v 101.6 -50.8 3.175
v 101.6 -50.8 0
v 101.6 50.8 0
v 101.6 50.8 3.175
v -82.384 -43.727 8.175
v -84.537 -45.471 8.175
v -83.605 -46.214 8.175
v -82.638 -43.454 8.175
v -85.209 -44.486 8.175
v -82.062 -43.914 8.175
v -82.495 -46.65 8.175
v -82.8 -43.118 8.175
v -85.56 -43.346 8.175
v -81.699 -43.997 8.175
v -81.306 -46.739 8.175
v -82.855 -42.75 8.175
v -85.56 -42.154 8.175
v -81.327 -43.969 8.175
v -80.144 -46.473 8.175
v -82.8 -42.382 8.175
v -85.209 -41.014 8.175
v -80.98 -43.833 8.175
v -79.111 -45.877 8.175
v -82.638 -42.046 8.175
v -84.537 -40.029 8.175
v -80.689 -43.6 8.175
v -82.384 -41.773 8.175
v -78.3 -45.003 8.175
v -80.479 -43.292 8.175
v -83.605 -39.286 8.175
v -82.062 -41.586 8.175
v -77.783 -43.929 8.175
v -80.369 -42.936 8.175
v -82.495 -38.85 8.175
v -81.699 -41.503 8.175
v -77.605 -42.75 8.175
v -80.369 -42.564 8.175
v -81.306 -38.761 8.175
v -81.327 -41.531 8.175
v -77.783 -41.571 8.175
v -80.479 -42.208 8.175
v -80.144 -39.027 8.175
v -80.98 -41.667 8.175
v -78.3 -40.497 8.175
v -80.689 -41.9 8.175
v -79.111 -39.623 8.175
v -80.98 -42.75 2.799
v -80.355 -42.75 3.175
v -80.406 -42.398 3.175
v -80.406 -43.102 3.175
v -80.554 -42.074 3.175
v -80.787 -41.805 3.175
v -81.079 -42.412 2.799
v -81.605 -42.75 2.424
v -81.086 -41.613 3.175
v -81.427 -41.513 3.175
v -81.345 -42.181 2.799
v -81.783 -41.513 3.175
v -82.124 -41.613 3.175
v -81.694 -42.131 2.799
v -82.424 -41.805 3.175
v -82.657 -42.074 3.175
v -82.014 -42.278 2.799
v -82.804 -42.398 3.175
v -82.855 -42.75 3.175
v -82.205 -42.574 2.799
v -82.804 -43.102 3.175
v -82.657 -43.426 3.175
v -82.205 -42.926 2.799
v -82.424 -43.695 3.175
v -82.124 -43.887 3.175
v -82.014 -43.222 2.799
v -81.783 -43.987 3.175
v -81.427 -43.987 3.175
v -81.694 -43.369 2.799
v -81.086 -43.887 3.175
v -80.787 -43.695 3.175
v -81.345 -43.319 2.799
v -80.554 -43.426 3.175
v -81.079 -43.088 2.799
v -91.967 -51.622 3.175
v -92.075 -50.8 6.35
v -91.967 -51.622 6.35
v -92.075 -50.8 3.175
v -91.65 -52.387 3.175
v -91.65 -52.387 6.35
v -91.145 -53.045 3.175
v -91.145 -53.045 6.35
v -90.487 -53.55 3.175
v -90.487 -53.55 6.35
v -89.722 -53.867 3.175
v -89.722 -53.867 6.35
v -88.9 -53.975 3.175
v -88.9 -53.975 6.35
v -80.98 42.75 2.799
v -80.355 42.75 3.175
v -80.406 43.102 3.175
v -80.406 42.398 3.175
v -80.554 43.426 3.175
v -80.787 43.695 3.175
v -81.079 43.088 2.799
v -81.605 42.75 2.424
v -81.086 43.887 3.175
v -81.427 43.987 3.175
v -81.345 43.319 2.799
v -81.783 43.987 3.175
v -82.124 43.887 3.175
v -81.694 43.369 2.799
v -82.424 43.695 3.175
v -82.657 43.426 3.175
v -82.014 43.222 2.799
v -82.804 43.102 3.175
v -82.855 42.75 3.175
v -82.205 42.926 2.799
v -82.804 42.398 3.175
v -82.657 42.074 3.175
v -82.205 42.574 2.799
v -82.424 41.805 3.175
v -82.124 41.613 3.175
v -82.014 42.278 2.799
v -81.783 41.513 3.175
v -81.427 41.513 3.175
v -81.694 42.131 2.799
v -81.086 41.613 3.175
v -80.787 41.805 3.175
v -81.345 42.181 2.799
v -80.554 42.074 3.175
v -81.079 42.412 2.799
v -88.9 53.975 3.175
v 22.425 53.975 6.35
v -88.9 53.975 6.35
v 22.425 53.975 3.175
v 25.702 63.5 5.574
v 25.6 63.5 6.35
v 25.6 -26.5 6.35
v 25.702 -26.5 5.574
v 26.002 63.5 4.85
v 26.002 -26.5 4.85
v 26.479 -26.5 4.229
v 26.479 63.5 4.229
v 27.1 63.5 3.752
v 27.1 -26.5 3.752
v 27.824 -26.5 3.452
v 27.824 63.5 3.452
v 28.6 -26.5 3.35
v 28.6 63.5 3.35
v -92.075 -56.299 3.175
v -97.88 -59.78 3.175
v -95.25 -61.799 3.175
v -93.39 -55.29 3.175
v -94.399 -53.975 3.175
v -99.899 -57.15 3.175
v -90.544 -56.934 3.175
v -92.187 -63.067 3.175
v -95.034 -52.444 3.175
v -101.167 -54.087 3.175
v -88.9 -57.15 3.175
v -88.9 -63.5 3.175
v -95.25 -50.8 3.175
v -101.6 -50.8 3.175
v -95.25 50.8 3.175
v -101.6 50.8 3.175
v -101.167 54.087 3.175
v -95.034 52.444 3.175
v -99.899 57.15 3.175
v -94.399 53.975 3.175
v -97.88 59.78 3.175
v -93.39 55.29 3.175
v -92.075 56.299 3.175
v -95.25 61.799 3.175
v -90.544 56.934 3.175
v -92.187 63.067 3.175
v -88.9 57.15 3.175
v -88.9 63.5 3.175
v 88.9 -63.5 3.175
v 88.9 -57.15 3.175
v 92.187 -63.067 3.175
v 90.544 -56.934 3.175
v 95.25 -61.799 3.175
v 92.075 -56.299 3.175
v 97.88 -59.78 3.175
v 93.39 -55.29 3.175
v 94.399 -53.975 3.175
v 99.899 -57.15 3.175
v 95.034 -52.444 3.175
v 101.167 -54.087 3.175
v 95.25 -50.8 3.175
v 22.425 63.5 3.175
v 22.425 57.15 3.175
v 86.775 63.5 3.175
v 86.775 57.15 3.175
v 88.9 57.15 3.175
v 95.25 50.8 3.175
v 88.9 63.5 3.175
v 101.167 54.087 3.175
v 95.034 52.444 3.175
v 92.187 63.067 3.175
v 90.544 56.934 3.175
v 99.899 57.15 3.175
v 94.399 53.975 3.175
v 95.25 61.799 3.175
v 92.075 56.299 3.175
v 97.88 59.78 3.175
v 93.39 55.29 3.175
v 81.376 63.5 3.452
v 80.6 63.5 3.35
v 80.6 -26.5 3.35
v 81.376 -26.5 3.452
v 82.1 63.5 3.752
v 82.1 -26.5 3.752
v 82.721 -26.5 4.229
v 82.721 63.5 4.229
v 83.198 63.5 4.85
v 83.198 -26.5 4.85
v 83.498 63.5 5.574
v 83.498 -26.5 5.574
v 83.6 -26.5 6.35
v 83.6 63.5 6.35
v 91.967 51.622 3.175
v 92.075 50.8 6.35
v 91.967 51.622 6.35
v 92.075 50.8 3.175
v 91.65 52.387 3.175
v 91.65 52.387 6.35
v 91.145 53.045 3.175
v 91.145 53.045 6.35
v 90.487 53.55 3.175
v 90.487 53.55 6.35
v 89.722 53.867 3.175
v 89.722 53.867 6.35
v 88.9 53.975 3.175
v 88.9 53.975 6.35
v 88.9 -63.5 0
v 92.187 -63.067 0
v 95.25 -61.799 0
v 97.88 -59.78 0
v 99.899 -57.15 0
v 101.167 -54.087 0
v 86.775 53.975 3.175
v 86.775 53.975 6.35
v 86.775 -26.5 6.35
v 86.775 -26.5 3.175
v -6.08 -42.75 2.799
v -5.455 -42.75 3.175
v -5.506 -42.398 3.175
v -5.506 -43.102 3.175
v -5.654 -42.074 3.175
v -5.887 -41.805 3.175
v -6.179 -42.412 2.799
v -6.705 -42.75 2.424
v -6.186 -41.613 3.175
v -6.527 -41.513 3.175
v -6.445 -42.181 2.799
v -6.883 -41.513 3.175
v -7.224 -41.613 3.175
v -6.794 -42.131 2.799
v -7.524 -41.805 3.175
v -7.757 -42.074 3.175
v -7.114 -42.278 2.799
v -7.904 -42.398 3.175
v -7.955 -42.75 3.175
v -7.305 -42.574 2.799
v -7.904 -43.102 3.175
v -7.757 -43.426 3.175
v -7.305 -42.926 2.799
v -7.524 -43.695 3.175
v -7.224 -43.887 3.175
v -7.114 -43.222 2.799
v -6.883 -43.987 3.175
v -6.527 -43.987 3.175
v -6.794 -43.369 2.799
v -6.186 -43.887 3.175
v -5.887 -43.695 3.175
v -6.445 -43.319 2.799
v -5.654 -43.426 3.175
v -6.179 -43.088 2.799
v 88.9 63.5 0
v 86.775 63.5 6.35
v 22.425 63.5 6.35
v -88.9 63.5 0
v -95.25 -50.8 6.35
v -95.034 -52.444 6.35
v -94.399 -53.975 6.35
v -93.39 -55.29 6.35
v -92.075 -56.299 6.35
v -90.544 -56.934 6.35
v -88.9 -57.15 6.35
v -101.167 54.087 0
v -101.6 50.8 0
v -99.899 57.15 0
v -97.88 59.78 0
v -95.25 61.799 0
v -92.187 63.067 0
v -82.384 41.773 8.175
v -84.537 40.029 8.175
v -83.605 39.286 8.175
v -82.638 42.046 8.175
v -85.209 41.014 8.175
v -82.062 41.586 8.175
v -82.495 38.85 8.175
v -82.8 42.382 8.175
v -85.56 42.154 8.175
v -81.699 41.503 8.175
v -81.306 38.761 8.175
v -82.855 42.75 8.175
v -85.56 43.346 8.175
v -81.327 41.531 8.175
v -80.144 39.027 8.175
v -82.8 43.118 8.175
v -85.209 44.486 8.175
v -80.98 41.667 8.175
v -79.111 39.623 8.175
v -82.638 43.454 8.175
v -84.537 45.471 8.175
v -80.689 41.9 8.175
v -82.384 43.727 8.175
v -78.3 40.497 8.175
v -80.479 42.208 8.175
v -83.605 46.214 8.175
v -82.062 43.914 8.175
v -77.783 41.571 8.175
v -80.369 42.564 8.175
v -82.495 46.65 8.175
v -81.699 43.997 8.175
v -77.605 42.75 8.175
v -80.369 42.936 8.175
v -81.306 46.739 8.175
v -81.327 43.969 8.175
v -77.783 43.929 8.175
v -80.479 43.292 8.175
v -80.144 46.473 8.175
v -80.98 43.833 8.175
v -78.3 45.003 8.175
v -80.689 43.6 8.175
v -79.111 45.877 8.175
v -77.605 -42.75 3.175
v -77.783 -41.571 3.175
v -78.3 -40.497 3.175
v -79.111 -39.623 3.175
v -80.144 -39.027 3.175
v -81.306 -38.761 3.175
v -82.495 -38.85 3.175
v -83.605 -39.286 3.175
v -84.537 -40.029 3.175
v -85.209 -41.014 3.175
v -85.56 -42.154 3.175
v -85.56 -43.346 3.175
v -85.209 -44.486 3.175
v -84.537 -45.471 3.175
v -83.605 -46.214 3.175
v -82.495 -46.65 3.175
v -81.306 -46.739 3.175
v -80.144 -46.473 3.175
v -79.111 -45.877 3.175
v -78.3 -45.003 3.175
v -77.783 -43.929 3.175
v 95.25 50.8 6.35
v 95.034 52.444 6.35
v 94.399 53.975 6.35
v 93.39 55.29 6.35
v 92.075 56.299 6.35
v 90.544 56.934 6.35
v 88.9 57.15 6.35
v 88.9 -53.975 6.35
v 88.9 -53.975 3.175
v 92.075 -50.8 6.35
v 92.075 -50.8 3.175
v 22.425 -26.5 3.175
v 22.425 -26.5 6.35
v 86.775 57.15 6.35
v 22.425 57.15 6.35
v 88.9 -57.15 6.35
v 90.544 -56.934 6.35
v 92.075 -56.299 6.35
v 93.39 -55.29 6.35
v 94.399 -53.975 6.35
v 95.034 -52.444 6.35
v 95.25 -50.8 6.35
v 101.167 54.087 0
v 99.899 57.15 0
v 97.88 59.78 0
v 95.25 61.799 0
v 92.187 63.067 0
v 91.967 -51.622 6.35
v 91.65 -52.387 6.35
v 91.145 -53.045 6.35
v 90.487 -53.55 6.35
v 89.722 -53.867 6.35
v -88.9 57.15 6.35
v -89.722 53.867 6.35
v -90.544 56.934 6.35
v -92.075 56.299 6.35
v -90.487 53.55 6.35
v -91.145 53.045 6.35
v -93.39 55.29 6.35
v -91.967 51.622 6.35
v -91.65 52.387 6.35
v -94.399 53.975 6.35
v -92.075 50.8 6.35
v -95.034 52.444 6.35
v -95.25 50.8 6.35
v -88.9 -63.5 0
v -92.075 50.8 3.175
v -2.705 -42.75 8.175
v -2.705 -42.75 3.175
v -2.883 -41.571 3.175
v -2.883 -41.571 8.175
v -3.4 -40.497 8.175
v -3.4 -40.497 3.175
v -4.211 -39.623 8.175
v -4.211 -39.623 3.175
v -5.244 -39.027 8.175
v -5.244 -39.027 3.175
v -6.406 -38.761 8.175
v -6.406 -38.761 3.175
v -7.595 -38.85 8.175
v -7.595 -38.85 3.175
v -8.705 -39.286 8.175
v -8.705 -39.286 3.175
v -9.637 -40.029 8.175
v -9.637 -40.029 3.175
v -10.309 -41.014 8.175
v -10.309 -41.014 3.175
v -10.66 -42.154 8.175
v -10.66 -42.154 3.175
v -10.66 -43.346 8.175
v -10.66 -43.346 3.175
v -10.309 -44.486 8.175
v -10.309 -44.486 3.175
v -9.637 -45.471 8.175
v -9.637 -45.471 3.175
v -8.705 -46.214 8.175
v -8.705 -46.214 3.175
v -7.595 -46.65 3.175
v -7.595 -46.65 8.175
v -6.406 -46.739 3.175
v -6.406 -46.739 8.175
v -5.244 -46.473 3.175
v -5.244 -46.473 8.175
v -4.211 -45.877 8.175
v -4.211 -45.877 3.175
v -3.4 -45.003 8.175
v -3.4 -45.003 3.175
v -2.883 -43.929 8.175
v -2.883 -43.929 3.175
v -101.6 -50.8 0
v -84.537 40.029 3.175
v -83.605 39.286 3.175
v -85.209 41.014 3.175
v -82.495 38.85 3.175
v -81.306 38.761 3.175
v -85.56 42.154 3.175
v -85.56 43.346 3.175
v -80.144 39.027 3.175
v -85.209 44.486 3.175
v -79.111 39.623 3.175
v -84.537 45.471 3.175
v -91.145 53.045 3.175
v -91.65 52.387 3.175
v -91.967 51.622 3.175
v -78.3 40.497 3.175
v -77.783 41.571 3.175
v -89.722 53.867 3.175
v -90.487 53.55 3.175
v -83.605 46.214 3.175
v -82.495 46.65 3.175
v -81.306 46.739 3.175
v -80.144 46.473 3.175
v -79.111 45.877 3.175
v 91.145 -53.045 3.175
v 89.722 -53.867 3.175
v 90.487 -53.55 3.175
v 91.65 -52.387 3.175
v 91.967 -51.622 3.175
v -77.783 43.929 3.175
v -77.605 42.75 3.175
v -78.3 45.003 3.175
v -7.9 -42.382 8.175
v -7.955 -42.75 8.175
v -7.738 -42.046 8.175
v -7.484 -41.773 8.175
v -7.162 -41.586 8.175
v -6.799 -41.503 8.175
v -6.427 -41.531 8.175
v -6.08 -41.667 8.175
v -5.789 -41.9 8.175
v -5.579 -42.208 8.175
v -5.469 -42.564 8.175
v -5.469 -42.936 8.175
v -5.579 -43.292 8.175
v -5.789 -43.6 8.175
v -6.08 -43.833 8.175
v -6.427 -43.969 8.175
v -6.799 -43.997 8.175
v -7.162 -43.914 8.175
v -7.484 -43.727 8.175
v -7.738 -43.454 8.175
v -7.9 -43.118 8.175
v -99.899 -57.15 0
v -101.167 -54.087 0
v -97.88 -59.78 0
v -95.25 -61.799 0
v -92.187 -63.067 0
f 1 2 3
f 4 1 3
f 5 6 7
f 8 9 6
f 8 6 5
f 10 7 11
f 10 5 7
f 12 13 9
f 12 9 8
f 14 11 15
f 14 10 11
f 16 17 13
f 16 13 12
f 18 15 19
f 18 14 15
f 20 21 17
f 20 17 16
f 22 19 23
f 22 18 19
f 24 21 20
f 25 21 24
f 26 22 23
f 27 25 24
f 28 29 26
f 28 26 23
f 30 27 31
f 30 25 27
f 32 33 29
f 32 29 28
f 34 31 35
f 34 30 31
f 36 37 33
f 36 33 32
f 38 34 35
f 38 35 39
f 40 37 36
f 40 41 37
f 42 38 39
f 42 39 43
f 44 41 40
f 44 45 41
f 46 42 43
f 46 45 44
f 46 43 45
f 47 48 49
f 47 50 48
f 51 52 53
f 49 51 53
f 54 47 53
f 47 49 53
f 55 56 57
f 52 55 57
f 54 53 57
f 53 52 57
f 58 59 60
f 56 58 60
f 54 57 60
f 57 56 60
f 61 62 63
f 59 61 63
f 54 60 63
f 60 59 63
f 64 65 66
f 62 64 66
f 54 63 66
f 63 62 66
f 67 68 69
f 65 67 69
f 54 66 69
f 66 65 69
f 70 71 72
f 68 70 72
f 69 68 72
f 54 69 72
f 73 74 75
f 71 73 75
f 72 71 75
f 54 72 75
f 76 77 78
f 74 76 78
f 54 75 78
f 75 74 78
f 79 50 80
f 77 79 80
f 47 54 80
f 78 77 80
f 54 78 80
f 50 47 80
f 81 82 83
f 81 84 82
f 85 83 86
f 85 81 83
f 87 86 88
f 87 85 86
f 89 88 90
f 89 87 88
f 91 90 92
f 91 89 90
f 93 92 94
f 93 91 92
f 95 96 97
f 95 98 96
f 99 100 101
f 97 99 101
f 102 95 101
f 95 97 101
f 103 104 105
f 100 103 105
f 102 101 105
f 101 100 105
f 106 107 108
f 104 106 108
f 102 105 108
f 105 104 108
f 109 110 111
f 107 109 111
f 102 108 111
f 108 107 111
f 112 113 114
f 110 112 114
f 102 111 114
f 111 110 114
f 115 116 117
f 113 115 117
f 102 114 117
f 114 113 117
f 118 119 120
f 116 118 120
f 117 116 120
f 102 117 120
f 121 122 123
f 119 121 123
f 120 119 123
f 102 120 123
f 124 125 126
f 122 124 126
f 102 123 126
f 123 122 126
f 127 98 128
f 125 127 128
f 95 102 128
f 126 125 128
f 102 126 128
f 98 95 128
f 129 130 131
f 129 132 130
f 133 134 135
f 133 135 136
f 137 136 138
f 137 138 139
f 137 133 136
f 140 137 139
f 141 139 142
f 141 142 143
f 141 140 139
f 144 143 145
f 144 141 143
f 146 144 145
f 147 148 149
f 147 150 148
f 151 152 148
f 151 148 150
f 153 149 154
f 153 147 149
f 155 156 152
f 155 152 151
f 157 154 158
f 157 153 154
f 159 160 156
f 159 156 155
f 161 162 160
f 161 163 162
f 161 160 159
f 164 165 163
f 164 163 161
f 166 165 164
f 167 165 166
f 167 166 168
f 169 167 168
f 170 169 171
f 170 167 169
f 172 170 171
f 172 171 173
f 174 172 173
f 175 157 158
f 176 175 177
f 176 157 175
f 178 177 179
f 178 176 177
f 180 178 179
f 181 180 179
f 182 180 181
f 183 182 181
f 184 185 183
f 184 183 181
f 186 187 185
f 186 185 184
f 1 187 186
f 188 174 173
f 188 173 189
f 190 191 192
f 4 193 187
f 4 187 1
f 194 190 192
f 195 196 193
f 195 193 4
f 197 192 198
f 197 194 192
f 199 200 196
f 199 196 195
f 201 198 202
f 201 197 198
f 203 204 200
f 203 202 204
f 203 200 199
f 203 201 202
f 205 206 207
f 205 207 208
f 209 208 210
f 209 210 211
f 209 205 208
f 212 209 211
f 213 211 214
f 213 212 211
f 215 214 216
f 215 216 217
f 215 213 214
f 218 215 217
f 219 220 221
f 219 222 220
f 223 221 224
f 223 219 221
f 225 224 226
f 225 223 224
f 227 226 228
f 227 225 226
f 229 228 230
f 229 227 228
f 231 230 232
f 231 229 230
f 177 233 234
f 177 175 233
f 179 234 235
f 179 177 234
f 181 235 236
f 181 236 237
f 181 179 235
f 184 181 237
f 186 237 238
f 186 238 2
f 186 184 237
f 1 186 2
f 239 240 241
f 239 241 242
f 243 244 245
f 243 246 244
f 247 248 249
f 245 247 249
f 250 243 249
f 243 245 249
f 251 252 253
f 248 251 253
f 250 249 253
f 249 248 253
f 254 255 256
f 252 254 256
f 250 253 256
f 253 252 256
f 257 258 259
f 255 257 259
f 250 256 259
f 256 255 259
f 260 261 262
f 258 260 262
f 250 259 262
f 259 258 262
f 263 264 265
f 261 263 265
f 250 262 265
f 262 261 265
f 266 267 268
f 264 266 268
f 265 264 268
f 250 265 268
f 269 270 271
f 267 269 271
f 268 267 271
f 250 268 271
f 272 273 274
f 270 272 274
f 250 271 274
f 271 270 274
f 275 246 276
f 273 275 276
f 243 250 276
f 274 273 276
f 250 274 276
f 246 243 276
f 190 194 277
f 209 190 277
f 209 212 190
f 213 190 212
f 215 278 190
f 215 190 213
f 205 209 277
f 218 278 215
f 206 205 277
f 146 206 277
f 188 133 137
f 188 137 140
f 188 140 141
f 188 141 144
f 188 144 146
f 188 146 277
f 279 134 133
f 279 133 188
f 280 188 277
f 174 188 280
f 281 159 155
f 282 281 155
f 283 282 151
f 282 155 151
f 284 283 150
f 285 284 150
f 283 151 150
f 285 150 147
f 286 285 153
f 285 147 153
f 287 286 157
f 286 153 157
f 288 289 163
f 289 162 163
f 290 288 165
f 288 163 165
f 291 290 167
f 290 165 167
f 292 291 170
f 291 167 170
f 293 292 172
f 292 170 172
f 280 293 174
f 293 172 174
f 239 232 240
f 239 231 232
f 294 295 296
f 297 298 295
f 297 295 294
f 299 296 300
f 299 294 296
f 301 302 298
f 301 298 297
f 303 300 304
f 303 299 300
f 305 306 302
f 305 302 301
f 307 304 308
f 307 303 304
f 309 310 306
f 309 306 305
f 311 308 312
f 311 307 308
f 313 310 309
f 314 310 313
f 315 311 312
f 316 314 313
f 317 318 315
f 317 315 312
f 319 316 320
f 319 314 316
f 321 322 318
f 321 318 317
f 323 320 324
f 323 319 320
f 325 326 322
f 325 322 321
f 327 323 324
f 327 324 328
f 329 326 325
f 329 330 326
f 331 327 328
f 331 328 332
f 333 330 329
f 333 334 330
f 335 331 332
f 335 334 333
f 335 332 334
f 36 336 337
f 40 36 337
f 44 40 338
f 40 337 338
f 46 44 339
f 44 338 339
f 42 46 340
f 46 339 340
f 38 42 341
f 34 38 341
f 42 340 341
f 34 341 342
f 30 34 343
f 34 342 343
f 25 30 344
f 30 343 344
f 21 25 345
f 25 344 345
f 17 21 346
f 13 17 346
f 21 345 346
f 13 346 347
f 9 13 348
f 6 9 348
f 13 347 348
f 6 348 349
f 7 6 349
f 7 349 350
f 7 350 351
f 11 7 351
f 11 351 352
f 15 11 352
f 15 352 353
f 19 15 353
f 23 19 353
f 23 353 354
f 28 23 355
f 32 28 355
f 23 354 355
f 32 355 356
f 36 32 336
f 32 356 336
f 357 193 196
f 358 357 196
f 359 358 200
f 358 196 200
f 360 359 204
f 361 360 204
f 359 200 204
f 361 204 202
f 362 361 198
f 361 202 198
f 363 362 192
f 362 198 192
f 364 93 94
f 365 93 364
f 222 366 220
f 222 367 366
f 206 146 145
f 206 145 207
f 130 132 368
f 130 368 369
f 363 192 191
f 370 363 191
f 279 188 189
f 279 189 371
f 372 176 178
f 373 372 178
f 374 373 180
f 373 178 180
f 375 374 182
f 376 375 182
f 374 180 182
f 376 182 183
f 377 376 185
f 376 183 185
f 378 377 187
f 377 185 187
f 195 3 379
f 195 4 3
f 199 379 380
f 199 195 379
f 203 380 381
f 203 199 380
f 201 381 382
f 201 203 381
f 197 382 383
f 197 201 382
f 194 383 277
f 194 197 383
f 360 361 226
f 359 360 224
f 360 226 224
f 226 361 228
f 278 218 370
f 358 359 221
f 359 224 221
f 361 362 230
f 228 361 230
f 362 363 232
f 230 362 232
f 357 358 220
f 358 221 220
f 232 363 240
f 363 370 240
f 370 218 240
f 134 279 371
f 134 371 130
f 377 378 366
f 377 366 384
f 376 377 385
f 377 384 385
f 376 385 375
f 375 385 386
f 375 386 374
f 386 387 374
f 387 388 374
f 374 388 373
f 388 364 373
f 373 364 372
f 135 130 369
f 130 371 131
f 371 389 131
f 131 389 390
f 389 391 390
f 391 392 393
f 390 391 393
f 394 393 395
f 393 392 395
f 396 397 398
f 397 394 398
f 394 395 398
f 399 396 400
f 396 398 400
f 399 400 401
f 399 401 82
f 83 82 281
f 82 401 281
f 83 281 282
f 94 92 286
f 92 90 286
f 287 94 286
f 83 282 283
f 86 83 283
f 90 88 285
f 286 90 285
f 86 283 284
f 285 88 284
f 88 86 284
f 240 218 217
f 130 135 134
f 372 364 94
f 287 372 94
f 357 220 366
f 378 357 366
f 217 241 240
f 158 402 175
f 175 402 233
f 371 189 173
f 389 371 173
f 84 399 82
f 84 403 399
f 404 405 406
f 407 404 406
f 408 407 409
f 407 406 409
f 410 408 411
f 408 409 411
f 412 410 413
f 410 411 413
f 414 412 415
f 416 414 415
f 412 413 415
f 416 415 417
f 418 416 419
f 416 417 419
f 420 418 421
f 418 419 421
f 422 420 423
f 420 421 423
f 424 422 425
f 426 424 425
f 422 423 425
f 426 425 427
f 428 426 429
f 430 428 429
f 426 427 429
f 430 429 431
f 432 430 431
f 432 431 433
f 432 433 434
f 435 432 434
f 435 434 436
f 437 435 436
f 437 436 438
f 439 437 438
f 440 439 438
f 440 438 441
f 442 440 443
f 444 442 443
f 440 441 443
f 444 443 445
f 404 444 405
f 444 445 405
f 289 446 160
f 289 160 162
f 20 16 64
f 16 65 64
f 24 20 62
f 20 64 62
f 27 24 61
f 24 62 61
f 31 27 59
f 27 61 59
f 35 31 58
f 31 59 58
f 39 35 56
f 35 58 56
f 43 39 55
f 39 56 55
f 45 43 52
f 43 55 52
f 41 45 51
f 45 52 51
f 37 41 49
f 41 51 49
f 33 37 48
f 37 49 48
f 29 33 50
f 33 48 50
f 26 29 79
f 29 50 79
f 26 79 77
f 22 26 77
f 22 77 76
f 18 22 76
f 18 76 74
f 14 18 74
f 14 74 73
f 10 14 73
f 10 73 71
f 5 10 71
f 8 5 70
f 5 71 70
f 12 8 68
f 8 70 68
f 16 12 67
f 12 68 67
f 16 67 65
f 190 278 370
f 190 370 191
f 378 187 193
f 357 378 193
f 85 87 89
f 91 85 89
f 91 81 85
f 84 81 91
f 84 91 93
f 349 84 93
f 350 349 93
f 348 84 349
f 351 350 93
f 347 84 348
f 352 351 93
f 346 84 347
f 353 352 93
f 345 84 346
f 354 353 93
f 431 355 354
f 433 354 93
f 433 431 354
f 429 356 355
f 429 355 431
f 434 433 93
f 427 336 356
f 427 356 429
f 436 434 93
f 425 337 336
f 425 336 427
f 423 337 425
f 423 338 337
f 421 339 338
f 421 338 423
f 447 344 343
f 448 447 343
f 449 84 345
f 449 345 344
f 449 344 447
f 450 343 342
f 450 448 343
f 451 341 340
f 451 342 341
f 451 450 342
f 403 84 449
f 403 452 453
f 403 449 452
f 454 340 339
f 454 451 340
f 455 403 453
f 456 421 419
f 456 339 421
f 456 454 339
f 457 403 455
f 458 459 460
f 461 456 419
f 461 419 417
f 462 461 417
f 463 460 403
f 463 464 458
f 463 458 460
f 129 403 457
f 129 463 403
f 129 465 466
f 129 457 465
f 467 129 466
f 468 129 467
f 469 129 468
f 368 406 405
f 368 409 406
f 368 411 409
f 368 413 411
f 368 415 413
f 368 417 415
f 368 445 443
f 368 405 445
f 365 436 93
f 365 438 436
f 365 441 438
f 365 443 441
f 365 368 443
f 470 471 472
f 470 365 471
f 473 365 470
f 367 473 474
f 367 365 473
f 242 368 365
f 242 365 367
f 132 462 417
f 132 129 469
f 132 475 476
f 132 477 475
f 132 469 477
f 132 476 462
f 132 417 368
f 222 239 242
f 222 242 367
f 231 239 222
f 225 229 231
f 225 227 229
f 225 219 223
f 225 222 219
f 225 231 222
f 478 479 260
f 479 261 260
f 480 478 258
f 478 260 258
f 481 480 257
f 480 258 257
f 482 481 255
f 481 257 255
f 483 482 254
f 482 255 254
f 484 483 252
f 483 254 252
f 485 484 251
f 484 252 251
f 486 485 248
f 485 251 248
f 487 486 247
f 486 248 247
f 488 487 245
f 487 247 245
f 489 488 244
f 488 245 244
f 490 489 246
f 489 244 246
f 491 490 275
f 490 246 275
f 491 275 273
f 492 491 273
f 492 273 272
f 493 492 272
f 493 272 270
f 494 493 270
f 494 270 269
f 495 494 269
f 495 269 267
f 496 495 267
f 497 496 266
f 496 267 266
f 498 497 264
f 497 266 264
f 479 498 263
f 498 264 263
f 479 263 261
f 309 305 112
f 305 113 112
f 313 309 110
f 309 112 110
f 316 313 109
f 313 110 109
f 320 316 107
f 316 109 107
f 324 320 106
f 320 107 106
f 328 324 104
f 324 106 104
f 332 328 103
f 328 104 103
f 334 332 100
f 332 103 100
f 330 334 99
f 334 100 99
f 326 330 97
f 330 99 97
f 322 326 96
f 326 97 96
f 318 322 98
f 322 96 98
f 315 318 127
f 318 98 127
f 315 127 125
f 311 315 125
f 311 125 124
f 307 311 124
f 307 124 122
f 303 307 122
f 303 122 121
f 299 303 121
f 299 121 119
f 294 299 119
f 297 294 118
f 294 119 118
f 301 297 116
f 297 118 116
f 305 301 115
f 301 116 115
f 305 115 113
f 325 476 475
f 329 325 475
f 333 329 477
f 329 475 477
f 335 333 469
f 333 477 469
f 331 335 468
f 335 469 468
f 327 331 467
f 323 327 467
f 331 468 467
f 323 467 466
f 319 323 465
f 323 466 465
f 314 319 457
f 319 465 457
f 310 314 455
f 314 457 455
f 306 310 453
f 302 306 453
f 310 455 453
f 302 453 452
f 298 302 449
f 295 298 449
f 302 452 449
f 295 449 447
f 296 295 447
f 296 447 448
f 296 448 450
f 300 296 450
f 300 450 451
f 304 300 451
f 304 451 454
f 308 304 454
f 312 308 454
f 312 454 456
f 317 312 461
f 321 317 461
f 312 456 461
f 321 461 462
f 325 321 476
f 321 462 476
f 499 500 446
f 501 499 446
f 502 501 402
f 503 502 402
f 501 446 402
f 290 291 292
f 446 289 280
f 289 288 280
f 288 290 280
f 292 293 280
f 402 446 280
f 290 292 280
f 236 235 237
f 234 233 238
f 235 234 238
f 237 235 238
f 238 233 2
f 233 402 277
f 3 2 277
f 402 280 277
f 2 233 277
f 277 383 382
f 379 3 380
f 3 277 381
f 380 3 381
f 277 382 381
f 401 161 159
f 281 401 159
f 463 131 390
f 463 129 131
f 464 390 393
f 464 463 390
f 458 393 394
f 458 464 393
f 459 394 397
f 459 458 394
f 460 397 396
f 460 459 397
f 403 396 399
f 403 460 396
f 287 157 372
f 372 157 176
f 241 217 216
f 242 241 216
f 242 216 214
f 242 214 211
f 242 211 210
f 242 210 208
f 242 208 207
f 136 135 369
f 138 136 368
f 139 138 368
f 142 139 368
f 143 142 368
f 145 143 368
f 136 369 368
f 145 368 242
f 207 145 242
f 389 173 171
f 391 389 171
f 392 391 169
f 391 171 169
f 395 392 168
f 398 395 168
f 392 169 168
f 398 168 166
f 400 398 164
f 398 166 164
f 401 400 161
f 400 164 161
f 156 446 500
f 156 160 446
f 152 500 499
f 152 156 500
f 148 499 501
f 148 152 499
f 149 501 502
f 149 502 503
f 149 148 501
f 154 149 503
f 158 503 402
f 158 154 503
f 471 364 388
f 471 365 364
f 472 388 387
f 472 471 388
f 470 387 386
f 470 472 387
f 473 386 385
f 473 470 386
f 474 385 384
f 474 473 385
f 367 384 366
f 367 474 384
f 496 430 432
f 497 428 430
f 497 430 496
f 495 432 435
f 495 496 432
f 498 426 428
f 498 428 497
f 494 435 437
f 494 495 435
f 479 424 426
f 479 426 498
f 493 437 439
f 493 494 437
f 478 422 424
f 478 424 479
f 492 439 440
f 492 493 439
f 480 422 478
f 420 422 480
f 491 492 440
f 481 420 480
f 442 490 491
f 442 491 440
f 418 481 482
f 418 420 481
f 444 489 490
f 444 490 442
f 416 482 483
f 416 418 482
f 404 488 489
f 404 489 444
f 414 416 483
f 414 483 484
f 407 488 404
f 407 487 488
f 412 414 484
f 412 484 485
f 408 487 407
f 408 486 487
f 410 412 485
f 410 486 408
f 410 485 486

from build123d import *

# Parameters (mm, degrees)
F0_W             = 203.2
F0_H             = 127
F1_DEPTH         = 3.175
F2_R             = 12.7
F4_DEPTH         = 3.175
F5_T             = -3.175
F6_W             = 58
F6_H             = 9.525
F7_DEPTH         = 3.176
F9_DEPTH         = 90
F10_DEPTH        = 3.175
F11_DEPTH        = 3.175
F12_R            = 4
F13_DEPTH        = 5
F17_D            = 2.5
F17_DEPTH        = 5
F17_TIP          = 0.7510757738
F17_ON_F15_D     = 2.5
F17_ON_F15_DEPTH = 5
F17_ON_F15_TIP   = 0.7510757738
F17_ON_F16_D     = 2.5
F17_ON_F16_DEPTH = 5
F17_ON_F16_TIP   = 0.7510757738


# Not quite as in the source:
# - a feature names something its author has since deleted; it is built from what else it names


with BuildPart() as f1:
    # F0 (on Top) → F1 (new body)
    with BuildSketch(Plane.XY):
        Rectangle(F0_W, F0_H)
    extrude(amount=F1_DEPTH)

    # F2
    f2_edges = [f1.edges().sort_by_distance(p)[0] for p in [
        (-101.6, -63.5, 1.5875),
        (-101.6, 63.5, 1.5875),
        (101.6, -63.5, 1.5875),
        (101.6, 63.5, 1.5875),
    ]]
    fillet(f2_edges, radius=F2_R)

    # F3 (on face) → F4 (join)
    with BuildSketch(Plane.XY.offset(3.175)):
        with BuildLine():
            Line((88.9, 57.15), (-88.9, 57.15))
            ThreePointArc((-88.9, 57.15), (-93.3901280605, 55.2901280605), (-95.25, 50.8))
            Line((-95.25, 50.8), (-95.25, -50.8))
            ThreePointArc((-95.25, -50.8), (-93.3901280605, -55.2901280605), (-88.9, -57.15))
            Line((-88.9, -57.15), (88.9, -57.15))
            ThreePointArc((88.9, -57.15), (93.3901280605, -55.2901280605), (95.25, -50.8))
            Line((95.25, -50.8), (95.25, 50.8))
            ThreePointArc((95.25, 50.8), (93.3901280605, 55.2901280605), (88.9, 57.15))
        make_face()
    extrude(amount=F4_DEPTH)

    # F5
    f5_openings = [f1.faces().sort_by_distance(p)[0] for p in [
        (0, 0, 6.35),
    ]]
    offset(amount=F5_T, openings=f5_openings, kind=Kind.INTERSECTION)

    # F6 (on face) → F7 (cut, through all)
    with BuildSketch(Plane.XY.offset(3.175)):
        with Locations((54.6, 58.7375)):
            Rectangle(F6_W, F6_H)
    extrude(amount=F7_DEPTH, mode=Mode.SUBTRACT)

    # F8 (on face) → F9 (join)
    with BuildSketch(Plane(origin=(0, 63.5, 0), x_dir=(-1, 0, 0), z_dir=(0, 1, 0))):
        with BuildLine():
            Line((-83.6, 6.35), (-83.6, 3.175))
            Line((-83.6, 3.175), (-25.6, 3.175))
            Line((-25.6, 3.175), (-25.6, 6.35))
            ThreePointArc((-25.6, 6.35), (-26.4786796564, 4.2286796564), (-28.6, 3.35))
            Line((-28.6, 3.35), (-80.6, 3.35))
            ThreePointArc((-80.6, 3.35), (-82.7213203436, 4.2286796564), (-83.6, 6.35))
        make_face()
    extrude(amount=-F9_DEPTH)

    # F10 (add): faces of the model
    f10_faces = [f1.faces().sort_by_distance(p)[0] for p in [
        (25.6, 13.7375, 4.7625),
        (25.6, 60.325, 4.7625),
    ]]
    extrude(f10_faces, amount=F10_DEPTH)

    # F11 (add): faces of the model
    f11_faces = [f1.faces().sort_by_distance(p)[0] for p in [
        (83.6, 13.7375, 4.7625),
        (83.6, 60.325, 4.7625),
    ]]
    extrude(f11_faces, amount=F11_DEPTH)

    # F12 (on face) → F13 (join)
    with BuildSketch(Plane.XY.offset(3.175)):
        with Locations((-81.6051200401, -42.75)):
            Circle(F12_R)
        with Locations((-6.7051200401, -42.75)):
            Circle(F12_R)
        with Locations((-81.6051200401, 42.75)):
            Circle(F12_R)
    extrude(amount=F13_DEPTH)

    # F17
    with Locations(Plane.XY.offset(8.175)):
        with Locations((-81.6051200401, 42.75)):
            Hole(F17_D / 2, depth=F17_DEPTH)
            with Locations((0, 0, -(F17_DEPTH + F17_TIP / 2))):  # 118° drill point
                Cone(0, F17_D / 2, F17_TIP, mode=Mode.SUBTRACT)

    # F17 on F15
    with Locations(Plane.XY.offset(8.175)):
        with Locations((-81.6051200401, -42.75)):
            Hole(F17_ON_F15_D / 2, depth=F17_ON_F15_DEPTH)
            with Locations((0, 0, -(F17_ON_F15_DEPTH + F17_ON_F15_TIP / 2))):  # 118° drill point
                Cone(0, F17_ON_F15_D / 2, F17_ON_F15_TIP, mode=Mode.SUBTRACT)

    # F17 on F16
    with Locations(Plane.XY.offset(8.175)):
        with Locations((-6.7051200401, -42.75)):
            Hole(F17_ON_F16_D / 2, depth=F17_ON_F16_DEPTH)
            with Locations((0, 0, -(F17_ON_F16_DEPTH + F17_ON_F16_TIP / 2))):  # 118° drill point
                Cone(0, F17_ON_F16_D / 2, F17_ON_F16_TIP, mode=Mode.SUBTRACT)


solid = f1.part
